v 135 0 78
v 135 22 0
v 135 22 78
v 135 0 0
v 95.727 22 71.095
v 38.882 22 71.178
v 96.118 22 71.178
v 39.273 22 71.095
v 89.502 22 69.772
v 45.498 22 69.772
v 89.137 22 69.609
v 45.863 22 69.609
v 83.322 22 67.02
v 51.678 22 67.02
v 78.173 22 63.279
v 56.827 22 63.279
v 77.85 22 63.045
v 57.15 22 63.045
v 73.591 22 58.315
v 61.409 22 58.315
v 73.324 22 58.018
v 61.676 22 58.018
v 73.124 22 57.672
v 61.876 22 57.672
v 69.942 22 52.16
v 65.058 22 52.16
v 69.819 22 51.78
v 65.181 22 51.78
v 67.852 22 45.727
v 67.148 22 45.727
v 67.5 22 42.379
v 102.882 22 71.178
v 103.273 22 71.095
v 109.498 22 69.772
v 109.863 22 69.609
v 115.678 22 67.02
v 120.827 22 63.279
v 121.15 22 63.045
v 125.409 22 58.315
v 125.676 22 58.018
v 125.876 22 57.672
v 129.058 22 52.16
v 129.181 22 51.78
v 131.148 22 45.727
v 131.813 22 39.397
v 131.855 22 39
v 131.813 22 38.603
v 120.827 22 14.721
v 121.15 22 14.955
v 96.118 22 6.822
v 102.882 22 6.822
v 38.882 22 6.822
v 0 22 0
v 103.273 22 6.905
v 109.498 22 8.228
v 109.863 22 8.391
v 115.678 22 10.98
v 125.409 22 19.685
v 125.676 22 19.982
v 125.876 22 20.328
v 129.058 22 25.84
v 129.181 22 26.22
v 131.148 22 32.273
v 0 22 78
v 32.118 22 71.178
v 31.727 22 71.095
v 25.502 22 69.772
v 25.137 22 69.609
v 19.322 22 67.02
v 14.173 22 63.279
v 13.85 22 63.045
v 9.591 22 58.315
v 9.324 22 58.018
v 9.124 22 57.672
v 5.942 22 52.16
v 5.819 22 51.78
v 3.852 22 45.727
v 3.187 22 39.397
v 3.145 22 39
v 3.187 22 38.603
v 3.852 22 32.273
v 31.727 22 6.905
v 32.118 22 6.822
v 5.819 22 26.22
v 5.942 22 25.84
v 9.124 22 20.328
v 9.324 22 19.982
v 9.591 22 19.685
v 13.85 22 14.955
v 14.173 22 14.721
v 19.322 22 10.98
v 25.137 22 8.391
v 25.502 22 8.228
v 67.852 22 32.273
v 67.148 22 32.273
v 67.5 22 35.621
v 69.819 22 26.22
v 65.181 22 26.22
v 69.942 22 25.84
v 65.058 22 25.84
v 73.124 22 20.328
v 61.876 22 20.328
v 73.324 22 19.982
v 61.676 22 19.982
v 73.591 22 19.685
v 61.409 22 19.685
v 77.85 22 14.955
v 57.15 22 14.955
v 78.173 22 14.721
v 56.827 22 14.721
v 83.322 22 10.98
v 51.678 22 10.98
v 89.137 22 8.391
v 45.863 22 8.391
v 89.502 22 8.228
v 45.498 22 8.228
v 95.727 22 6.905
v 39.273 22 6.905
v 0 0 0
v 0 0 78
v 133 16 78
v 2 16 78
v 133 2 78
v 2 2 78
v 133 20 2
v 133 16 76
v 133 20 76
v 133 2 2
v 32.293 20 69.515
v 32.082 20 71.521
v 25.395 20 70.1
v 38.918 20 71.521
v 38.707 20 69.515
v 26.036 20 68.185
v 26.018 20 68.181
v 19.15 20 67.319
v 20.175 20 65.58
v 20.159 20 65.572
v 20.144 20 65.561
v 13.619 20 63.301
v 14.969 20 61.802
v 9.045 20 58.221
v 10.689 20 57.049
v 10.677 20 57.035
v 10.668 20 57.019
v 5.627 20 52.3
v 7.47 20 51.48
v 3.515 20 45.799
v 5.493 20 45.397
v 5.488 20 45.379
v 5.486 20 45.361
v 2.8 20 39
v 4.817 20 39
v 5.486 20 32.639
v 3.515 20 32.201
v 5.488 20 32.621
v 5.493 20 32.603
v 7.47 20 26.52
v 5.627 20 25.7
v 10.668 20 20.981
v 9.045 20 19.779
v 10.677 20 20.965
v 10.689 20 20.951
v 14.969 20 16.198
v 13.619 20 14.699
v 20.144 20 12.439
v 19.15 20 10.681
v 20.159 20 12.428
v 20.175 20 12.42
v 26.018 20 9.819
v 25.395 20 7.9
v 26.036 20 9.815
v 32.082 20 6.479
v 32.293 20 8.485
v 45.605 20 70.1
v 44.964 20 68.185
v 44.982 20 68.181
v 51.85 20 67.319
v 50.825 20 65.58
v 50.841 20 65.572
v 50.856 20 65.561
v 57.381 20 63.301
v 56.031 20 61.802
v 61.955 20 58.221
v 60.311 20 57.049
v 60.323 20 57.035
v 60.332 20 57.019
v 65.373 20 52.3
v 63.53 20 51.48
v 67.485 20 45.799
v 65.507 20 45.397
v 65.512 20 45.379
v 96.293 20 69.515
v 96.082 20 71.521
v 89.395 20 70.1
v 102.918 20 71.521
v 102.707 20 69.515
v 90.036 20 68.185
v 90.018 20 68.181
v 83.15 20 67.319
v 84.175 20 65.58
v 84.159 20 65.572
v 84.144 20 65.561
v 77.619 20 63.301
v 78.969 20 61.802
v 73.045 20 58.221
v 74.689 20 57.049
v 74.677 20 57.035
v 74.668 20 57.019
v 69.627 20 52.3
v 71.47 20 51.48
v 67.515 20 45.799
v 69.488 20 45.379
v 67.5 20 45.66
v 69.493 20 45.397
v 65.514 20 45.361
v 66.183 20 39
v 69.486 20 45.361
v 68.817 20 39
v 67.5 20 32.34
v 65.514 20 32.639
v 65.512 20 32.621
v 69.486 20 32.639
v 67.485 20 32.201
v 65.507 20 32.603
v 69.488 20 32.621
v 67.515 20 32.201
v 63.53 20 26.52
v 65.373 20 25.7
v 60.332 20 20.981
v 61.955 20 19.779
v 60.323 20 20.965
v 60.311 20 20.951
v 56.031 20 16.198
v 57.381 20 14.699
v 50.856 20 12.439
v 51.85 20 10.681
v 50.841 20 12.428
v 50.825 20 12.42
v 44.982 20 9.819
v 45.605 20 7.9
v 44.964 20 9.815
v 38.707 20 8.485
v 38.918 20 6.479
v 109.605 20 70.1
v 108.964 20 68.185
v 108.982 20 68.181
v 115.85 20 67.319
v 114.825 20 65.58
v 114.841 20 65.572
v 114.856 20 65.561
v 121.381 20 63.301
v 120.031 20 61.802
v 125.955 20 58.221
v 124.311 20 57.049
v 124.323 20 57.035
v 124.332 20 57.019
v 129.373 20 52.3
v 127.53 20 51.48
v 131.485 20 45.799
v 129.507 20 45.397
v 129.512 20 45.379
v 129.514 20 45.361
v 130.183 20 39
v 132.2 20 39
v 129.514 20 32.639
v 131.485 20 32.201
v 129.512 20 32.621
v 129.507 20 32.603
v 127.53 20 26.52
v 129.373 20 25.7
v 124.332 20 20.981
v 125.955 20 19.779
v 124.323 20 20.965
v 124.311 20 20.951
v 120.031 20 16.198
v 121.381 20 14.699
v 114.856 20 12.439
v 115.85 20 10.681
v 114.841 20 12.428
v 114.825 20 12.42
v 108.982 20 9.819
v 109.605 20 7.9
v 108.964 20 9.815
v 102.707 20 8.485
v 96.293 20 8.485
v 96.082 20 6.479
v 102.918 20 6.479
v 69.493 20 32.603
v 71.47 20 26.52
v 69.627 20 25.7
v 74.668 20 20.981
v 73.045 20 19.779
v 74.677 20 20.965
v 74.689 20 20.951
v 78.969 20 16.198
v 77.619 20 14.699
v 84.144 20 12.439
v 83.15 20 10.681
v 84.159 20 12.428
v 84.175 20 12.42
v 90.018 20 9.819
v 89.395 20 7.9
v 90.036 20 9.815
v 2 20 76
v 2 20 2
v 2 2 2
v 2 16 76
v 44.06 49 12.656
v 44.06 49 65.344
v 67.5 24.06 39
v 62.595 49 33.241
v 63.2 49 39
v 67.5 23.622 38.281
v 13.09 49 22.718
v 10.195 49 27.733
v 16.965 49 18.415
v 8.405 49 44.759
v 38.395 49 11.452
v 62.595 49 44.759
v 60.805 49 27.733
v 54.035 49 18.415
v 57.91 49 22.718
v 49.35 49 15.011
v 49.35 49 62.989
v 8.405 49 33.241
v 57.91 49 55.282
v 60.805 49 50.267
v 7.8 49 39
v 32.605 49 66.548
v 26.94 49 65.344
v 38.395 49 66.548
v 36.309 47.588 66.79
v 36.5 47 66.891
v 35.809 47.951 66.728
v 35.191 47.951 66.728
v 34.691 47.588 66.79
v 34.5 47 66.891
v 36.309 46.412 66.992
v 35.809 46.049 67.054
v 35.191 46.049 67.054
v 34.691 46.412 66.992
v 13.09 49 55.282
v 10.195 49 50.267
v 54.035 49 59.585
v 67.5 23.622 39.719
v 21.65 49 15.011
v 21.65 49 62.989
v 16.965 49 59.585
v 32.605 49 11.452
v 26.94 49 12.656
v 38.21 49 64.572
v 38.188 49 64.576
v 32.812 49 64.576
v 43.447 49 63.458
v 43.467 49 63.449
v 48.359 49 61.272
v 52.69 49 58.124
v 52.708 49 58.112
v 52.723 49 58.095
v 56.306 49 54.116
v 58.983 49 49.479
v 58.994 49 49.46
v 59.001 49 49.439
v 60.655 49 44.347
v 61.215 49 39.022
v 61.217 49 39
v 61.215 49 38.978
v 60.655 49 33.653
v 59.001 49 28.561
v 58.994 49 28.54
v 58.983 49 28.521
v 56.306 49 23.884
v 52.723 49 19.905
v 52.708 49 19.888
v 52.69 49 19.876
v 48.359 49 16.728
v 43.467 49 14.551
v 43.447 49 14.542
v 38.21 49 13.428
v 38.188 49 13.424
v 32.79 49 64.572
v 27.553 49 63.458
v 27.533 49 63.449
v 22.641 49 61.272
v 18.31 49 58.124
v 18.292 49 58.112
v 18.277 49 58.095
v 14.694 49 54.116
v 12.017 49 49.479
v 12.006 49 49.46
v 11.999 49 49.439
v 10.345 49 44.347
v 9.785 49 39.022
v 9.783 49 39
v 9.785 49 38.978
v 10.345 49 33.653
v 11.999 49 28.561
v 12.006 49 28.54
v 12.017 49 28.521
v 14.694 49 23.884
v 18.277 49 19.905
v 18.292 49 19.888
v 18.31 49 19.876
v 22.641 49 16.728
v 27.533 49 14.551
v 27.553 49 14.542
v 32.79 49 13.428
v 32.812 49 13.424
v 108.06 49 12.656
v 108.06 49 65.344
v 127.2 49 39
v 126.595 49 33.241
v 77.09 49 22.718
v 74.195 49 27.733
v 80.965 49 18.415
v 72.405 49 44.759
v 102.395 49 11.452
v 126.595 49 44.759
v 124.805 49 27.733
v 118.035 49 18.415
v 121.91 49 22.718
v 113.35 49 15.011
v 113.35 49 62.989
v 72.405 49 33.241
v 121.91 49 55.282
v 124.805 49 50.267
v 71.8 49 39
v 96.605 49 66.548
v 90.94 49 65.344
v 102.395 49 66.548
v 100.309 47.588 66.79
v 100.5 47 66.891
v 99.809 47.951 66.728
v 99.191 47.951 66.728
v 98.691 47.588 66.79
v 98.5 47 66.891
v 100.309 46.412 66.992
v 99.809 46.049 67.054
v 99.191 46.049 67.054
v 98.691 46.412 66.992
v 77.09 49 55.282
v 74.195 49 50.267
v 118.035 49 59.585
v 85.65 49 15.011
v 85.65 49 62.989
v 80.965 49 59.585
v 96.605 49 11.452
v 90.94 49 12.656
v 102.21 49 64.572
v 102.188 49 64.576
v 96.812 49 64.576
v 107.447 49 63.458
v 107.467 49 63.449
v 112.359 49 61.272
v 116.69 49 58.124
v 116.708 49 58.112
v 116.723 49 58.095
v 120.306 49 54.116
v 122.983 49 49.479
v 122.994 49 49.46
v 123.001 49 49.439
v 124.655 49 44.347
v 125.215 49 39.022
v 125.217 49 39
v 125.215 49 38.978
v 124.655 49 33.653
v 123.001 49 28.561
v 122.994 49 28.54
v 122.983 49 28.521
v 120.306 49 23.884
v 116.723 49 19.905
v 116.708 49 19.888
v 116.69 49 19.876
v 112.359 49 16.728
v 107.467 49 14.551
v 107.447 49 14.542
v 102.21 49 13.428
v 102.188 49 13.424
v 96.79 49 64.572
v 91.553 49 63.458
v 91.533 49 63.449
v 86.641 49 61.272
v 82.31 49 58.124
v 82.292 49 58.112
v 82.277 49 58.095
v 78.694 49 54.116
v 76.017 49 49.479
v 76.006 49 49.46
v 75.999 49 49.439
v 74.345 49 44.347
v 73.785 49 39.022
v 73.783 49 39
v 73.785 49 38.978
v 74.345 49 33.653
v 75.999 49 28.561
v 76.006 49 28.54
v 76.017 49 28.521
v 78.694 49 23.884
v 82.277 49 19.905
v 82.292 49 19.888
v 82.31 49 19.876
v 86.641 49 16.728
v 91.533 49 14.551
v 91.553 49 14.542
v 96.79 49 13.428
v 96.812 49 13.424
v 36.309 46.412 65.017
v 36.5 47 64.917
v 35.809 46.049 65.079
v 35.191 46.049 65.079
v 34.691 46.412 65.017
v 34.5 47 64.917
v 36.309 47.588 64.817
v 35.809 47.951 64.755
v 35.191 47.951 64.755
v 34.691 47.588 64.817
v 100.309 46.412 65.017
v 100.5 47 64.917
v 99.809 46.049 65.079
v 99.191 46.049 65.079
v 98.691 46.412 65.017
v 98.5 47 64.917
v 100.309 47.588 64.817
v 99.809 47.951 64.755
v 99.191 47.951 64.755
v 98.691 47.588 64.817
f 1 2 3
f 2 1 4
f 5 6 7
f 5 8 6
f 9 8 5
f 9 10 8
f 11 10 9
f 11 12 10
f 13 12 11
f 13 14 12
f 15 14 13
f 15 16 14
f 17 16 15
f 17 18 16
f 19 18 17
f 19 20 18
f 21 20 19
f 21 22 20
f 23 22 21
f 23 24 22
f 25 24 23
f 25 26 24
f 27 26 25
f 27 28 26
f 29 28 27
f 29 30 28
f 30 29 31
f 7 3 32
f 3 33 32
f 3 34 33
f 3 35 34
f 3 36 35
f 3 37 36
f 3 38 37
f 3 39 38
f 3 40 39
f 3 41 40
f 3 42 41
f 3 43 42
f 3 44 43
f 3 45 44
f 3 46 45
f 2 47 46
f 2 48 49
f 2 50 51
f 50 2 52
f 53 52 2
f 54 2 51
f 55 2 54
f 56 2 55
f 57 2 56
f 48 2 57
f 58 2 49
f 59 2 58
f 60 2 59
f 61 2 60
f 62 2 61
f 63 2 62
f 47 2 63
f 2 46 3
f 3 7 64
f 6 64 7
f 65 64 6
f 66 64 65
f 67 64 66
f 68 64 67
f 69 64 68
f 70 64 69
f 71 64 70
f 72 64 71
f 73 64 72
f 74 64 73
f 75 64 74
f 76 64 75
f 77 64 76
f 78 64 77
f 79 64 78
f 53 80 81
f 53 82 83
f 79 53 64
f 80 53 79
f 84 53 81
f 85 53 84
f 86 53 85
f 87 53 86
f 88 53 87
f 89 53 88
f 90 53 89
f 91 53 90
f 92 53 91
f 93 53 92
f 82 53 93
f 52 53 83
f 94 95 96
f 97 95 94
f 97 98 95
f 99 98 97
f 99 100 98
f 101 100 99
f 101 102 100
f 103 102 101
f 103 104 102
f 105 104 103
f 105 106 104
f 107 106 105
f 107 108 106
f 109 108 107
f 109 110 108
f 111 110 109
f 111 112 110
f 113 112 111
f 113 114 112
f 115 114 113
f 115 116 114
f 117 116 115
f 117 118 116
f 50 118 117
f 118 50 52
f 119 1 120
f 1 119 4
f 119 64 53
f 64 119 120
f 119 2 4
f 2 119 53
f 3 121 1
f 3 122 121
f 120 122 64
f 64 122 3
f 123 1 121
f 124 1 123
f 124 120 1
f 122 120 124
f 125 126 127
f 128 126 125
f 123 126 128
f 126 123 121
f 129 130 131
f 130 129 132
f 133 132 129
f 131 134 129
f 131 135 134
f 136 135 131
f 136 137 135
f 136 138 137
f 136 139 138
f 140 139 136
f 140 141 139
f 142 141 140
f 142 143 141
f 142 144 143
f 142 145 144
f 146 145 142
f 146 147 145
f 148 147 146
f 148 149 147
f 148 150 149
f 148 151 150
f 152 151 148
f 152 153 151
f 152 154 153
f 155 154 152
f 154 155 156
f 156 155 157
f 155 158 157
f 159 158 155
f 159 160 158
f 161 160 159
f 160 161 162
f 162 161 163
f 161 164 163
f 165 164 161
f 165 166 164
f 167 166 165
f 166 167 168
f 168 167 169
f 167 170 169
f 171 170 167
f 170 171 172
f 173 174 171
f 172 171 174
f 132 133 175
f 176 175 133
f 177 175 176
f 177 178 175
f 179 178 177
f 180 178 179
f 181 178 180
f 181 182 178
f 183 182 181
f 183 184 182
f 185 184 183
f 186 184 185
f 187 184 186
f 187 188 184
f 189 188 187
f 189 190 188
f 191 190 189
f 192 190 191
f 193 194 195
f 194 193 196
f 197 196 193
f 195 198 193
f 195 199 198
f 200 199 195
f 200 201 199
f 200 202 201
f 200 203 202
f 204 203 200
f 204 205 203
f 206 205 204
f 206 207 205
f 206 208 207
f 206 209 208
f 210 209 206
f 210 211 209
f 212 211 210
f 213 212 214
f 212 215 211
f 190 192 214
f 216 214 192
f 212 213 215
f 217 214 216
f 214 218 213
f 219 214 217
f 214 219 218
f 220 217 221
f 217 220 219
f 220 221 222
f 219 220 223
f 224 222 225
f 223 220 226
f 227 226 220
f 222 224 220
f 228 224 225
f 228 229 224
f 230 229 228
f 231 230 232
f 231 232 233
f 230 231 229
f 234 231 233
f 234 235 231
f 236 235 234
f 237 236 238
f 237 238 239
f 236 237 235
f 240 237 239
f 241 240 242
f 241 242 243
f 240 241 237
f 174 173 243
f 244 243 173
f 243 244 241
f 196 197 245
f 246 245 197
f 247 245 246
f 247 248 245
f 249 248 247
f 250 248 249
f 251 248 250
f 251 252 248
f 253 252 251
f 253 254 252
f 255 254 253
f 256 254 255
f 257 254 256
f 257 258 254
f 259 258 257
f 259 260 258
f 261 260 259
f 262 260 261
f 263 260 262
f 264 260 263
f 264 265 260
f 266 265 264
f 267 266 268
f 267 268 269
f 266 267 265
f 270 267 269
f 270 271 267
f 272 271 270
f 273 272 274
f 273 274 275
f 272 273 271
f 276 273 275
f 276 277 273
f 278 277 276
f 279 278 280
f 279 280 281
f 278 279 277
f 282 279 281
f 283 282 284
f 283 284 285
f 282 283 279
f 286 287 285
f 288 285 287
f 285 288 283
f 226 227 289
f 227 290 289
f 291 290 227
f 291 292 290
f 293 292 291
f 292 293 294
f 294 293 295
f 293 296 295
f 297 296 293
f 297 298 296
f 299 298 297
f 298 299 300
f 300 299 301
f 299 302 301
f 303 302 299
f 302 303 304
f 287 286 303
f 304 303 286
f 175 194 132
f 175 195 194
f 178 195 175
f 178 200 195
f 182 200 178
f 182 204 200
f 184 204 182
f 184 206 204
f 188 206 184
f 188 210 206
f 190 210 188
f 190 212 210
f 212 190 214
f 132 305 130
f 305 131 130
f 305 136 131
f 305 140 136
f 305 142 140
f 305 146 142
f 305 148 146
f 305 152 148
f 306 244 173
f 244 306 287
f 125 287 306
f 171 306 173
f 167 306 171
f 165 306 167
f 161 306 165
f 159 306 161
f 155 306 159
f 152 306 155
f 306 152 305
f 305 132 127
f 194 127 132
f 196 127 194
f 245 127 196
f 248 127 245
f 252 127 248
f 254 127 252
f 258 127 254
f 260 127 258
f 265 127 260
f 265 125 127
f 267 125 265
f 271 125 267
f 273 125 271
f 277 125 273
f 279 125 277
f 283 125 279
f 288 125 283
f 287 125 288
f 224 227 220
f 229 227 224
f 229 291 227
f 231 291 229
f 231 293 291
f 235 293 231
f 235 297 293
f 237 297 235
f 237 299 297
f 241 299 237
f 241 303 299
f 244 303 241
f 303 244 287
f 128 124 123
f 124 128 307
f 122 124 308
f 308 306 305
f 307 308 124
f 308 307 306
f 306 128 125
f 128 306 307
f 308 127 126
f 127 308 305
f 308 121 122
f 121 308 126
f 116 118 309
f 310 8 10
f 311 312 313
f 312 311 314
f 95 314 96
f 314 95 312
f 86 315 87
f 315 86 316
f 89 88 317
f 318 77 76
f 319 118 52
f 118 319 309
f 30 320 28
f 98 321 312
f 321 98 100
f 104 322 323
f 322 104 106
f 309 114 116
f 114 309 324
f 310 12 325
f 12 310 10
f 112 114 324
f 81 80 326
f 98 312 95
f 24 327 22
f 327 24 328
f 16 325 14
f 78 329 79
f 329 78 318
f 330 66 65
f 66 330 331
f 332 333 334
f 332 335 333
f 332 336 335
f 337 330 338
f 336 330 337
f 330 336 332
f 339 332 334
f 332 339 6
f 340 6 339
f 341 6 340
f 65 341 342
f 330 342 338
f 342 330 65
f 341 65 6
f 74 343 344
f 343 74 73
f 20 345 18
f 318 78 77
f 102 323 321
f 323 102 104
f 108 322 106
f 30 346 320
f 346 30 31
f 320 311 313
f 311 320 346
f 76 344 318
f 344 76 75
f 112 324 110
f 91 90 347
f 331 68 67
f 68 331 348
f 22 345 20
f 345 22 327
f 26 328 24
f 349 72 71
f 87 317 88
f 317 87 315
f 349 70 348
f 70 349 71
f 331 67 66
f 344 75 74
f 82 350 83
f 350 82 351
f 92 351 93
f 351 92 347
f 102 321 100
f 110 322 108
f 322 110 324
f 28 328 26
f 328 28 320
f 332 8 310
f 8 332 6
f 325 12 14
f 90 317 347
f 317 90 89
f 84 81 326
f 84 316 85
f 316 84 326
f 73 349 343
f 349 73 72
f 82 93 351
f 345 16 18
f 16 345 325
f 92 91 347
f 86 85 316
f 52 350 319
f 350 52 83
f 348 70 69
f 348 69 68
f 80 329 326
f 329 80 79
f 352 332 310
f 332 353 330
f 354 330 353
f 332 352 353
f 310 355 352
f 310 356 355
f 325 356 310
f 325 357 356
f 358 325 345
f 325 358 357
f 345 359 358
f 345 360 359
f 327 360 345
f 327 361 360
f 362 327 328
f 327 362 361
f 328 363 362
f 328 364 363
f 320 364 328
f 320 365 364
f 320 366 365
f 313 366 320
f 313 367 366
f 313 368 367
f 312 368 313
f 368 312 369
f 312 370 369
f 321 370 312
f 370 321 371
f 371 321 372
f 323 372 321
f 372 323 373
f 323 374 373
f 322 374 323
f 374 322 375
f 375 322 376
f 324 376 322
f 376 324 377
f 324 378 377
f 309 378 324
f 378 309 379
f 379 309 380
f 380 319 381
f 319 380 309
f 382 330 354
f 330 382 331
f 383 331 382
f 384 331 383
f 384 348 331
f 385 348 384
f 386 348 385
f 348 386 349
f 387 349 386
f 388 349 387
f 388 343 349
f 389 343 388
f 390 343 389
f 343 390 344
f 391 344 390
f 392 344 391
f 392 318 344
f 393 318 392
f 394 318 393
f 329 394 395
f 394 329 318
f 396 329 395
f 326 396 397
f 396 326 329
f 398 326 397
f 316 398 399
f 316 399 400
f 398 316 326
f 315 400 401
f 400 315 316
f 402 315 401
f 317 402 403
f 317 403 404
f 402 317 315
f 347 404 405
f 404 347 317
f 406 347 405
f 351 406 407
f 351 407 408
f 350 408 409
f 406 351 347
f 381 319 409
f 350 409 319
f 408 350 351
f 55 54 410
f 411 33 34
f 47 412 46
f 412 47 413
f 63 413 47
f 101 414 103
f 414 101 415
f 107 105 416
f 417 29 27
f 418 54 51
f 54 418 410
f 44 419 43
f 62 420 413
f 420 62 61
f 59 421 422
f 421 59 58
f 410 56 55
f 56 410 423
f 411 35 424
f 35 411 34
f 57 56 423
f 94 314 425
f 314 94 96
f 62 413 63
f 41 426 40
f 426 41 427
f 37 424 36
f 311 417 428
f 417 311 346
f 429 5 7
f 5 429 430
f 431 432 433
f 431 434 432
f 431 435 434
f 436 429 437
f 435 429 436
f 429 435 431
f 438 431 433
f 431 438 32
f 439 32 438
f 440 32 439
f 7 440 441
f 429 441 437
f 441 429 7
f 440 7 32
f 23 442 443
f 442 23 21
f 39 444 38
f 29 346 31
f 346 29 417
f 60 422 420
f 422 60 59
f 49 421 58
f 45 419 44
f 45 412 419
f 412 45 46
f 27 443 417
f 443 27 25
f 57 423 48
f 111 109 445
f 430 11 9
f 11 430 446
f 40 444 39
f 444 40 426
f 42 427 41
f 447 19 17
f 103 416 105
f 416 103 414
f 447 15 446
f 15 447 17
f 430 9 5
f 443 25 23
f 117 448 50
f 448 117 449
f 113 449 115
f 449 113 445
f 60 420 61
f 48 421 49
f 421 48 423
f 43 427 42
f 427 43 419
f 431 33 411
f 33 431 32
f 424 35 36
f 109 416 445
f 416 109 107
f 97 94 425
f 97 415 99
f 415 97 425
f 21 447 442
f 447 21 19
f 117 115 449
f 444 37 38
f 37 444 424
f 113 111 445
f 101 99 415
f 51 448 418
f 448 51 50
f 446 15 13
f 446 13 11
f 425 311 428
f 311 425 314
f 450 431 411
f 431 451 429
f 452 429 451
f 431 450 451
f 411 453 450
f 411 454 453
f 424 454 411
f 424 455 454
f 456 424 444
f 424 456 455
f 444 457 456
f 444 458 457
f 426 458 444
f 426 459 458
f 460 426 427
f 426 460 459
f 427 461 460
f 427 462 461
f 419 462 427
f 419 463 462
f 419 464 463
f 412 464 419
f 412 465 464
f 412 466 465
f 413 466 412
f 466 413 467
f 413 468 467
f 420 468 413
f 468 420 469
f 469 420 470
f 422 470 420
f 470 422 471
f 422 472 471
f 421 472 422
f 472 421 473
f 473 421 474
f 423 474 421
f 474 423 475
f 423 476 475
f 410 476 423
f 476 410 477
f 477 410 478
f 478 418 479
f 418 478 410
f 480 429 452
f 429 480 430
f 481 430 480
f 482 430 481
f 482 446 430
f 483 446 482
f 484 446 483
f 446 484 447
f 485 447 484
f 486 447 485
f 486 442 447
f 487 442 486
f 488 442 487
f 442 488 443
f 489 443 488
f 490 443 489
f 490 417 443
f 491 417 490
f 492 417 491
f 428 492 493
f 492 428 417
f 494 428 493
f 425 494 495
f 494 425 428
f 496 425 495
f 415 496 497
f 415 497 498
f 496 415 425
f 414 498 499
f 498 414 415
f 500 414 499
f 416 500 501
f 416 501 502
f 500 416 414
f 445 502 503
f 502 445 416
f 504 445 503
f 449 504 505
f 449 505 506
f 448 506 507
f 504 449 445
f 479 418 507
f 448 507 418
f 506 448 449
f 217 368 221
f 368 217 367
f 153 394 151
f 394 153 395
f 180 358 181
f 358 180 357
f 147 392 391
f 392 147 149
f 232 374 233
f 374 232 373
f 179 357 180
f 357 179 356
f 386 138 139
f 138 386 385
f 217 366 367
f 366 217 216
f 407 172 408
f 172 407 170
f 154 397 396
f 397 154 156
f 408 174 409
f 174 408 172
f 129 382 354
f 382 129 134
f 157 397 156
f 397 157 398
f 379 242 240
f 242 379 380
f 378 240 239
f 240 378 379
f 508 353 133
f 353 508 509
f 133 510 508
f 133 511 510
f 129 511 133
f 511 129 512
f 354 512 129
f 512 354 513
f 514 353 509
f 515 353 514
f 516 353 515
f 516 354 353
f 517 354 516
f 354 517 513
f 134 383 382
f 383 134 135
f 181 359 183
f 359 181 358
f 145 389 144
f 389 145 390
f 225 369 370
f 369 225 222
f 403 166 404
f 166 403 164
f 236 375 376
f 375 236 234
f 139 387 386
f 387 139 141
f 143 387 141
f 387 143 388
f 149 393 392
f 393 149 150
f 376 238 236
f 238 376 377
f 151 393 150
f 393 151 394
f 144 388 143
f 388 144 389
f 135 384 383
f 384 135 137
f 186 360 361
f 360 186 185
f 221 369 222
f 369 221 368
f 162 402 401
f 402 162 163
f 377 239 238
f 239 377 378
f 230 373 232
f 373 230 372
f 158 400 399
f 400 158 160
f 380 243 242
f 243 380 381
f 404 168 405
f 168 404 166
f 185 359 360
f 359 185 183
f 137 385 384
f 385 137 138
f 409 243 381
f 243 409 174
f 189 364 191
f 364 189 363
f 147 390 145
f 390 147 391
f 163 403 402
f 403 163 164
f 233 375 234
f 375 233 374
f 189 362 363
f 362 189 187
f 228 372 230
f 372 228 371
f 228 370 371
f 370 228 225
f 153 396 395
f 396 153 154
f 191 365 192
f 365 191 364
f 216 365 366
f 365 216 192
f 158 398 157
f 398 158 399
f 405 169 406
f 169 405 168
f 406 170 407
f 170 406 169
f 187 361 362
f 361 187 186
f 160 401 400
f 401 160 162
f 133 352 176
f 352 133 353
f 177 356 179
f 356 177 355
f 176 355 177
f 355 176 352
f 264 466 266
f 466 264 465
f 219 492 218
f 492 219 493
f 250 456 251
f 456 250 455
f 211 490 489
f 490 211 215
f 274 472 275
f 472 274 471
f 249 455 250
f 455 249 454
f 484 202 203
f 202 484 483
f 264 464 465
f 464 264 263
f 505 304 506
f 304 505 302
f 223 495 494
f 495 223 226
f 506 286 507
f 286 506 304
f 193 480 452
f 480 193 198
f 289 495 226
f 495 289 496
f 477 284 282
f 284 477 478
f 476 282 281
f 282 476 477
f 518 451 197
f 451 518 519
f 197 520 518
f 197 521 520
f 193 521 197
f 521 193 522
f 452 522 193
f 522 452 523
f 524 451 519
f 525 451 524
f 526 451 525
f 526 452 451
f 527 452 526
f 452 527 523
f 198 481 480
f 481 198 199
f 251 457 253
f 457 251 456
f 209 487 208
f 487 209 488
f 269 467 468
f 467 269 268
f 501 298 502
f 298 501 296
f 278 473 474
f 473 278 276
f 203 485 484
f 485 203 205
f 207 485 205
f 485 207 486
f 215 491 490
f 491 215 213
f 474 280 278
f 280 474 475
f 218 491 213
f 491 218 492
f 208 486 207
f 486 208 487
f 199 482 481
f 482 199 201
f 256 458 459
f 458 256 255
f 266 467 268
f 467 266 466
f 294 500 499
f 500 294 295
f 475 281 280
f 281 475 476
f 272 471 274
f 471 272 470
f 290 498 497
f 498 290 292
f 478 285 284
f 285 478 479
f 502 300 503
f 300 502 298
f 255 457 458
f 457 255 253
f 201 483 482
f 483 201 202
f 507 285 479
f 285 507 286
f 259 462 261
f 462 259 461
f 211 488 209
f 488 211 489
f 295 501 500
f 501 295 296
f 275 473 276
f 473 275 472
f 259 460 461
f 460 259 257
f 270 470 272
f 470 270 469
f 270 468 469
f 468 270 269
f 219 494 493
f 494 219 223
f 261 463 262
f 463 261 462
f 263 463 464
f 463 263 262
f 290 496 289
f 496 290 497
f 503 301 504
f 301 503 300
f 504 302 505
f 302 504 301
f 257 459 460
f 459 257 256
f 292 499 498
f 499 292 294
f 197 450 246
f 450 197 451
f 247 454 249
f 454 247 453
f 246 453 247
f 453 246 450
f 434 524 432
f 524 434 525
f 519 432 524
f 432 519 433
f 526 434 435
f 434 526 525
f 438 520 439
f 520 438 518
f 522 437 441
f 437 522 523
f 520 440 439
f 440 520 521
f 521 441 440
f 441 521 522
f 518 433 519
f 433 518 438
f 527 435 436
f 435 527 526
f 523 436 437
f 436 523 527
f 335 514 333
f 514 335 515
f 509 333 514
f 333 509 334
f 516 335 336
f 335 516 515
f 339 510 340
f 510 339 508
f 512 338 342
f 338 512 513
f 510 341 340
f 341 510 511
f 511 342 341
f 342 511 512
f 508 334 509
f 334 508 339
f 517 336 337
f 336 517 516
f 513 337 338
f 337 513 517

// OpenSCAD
//Screen Length
screen_width = 131; //[1:250]
//Screen Width
screen_height = 74; //[1:170]
//Screen Cavity Height
screen_cavity_height = 18; //[4:100]
//Lens Cup Height
lens_height = 29; //[4:100]
//Lens Radius
lens_radius = 25.7;//[2:100]
//IPD
IPD = 64;//[45:85]
//Screen Opening Height
back_opening_height = 14;//[0:96]
//Wall Thickness
wall_thickness = 2;//[1:5]
//Screw Hole Radius
screw_radius = 1;//[0:5]
//Screw Hole Depth
screw_depth = 2;//[0:5]

translate([0,0,screen_height+(2*wall_thickness)]) rotate([-90,0,0]) difference(){
difference(){
//Right Lens Cavity
difference(){
	//Left Lens Cavity
	difference(){
		//Right Lens Outer
		union(){
			//Left Lens Outer
			union(){
				//Backdoor
				difference(){
					//Screen Cavity
					difference(){
						cube([screen_width+(wall_thickness*2),screen_height+(wall_thickness*2),screen_cavity_height+(wall_thickness*2)]);
						translate([wall_thickness,wall_thickness,wall_thickness]) cube([screen_width,screen_height,screen_cavity_height]);
					}
					translate([wall_thickness,-0.1,wall_thickness]) cube([screen_width,wall_thickness+0.2,back_opening_height]);
				}
				translate([(screen_width/2)-(IPD/2)+wall_thickness,(screen_height/2)+wall_thickness,screen_cavity_height+wall_thickness]) cylinder(lens_height,lens_radius+5+wall_thickness,lens_radius+wall_thickness);
			}
			translate([(screen_width/2)+(IPD/2)+wall_thickness,(screen_height/2)+wall_thickness,screen_cavity_height+wall_thickness]) cylinder(lens_height,lens_radius+5+wall_thickness,lens_radius+wall_thickness);
		}
		translate([(screen_width/2)-(IPD/2)+wall_thickness,(screen_height/2)+wall_thickness,screen_cavity_height+wall_thickness-0.1]) cylinder(lens_height+0.2,lens_radius+5,lens_radius);
	}
	translate([(screen_width/2)+(IPD/2)+wall_thickness,(screen_height/2)+wall_thickness,screen_cavity_height+wall_thickness-0.1]) cylinder(lens_height+0.2,lens_radius+5,lens_radius);
}

translate([(screen_width/2)+(IPD/2)+wall_thickness,(screen_height/2)+wall_thickness-lens_radius+1,screen_cavity_height+wall_thickness+lens_height-screw_depth]) rotate([90,0,0])  cylinder(5,screw_radius,screw_radius, $fn = 10);
}
translate([(screen_width/2)-(IPD/2)+wall_thickness,(screen_height/2)+wall_thickness-lens_radius+1,screen_cavity_height+wall_thickness+lens_height-screw_depth]) rotate([90,0,0])  cylinder(5,screw_radius,screw_radius, $fn = 10);
}
